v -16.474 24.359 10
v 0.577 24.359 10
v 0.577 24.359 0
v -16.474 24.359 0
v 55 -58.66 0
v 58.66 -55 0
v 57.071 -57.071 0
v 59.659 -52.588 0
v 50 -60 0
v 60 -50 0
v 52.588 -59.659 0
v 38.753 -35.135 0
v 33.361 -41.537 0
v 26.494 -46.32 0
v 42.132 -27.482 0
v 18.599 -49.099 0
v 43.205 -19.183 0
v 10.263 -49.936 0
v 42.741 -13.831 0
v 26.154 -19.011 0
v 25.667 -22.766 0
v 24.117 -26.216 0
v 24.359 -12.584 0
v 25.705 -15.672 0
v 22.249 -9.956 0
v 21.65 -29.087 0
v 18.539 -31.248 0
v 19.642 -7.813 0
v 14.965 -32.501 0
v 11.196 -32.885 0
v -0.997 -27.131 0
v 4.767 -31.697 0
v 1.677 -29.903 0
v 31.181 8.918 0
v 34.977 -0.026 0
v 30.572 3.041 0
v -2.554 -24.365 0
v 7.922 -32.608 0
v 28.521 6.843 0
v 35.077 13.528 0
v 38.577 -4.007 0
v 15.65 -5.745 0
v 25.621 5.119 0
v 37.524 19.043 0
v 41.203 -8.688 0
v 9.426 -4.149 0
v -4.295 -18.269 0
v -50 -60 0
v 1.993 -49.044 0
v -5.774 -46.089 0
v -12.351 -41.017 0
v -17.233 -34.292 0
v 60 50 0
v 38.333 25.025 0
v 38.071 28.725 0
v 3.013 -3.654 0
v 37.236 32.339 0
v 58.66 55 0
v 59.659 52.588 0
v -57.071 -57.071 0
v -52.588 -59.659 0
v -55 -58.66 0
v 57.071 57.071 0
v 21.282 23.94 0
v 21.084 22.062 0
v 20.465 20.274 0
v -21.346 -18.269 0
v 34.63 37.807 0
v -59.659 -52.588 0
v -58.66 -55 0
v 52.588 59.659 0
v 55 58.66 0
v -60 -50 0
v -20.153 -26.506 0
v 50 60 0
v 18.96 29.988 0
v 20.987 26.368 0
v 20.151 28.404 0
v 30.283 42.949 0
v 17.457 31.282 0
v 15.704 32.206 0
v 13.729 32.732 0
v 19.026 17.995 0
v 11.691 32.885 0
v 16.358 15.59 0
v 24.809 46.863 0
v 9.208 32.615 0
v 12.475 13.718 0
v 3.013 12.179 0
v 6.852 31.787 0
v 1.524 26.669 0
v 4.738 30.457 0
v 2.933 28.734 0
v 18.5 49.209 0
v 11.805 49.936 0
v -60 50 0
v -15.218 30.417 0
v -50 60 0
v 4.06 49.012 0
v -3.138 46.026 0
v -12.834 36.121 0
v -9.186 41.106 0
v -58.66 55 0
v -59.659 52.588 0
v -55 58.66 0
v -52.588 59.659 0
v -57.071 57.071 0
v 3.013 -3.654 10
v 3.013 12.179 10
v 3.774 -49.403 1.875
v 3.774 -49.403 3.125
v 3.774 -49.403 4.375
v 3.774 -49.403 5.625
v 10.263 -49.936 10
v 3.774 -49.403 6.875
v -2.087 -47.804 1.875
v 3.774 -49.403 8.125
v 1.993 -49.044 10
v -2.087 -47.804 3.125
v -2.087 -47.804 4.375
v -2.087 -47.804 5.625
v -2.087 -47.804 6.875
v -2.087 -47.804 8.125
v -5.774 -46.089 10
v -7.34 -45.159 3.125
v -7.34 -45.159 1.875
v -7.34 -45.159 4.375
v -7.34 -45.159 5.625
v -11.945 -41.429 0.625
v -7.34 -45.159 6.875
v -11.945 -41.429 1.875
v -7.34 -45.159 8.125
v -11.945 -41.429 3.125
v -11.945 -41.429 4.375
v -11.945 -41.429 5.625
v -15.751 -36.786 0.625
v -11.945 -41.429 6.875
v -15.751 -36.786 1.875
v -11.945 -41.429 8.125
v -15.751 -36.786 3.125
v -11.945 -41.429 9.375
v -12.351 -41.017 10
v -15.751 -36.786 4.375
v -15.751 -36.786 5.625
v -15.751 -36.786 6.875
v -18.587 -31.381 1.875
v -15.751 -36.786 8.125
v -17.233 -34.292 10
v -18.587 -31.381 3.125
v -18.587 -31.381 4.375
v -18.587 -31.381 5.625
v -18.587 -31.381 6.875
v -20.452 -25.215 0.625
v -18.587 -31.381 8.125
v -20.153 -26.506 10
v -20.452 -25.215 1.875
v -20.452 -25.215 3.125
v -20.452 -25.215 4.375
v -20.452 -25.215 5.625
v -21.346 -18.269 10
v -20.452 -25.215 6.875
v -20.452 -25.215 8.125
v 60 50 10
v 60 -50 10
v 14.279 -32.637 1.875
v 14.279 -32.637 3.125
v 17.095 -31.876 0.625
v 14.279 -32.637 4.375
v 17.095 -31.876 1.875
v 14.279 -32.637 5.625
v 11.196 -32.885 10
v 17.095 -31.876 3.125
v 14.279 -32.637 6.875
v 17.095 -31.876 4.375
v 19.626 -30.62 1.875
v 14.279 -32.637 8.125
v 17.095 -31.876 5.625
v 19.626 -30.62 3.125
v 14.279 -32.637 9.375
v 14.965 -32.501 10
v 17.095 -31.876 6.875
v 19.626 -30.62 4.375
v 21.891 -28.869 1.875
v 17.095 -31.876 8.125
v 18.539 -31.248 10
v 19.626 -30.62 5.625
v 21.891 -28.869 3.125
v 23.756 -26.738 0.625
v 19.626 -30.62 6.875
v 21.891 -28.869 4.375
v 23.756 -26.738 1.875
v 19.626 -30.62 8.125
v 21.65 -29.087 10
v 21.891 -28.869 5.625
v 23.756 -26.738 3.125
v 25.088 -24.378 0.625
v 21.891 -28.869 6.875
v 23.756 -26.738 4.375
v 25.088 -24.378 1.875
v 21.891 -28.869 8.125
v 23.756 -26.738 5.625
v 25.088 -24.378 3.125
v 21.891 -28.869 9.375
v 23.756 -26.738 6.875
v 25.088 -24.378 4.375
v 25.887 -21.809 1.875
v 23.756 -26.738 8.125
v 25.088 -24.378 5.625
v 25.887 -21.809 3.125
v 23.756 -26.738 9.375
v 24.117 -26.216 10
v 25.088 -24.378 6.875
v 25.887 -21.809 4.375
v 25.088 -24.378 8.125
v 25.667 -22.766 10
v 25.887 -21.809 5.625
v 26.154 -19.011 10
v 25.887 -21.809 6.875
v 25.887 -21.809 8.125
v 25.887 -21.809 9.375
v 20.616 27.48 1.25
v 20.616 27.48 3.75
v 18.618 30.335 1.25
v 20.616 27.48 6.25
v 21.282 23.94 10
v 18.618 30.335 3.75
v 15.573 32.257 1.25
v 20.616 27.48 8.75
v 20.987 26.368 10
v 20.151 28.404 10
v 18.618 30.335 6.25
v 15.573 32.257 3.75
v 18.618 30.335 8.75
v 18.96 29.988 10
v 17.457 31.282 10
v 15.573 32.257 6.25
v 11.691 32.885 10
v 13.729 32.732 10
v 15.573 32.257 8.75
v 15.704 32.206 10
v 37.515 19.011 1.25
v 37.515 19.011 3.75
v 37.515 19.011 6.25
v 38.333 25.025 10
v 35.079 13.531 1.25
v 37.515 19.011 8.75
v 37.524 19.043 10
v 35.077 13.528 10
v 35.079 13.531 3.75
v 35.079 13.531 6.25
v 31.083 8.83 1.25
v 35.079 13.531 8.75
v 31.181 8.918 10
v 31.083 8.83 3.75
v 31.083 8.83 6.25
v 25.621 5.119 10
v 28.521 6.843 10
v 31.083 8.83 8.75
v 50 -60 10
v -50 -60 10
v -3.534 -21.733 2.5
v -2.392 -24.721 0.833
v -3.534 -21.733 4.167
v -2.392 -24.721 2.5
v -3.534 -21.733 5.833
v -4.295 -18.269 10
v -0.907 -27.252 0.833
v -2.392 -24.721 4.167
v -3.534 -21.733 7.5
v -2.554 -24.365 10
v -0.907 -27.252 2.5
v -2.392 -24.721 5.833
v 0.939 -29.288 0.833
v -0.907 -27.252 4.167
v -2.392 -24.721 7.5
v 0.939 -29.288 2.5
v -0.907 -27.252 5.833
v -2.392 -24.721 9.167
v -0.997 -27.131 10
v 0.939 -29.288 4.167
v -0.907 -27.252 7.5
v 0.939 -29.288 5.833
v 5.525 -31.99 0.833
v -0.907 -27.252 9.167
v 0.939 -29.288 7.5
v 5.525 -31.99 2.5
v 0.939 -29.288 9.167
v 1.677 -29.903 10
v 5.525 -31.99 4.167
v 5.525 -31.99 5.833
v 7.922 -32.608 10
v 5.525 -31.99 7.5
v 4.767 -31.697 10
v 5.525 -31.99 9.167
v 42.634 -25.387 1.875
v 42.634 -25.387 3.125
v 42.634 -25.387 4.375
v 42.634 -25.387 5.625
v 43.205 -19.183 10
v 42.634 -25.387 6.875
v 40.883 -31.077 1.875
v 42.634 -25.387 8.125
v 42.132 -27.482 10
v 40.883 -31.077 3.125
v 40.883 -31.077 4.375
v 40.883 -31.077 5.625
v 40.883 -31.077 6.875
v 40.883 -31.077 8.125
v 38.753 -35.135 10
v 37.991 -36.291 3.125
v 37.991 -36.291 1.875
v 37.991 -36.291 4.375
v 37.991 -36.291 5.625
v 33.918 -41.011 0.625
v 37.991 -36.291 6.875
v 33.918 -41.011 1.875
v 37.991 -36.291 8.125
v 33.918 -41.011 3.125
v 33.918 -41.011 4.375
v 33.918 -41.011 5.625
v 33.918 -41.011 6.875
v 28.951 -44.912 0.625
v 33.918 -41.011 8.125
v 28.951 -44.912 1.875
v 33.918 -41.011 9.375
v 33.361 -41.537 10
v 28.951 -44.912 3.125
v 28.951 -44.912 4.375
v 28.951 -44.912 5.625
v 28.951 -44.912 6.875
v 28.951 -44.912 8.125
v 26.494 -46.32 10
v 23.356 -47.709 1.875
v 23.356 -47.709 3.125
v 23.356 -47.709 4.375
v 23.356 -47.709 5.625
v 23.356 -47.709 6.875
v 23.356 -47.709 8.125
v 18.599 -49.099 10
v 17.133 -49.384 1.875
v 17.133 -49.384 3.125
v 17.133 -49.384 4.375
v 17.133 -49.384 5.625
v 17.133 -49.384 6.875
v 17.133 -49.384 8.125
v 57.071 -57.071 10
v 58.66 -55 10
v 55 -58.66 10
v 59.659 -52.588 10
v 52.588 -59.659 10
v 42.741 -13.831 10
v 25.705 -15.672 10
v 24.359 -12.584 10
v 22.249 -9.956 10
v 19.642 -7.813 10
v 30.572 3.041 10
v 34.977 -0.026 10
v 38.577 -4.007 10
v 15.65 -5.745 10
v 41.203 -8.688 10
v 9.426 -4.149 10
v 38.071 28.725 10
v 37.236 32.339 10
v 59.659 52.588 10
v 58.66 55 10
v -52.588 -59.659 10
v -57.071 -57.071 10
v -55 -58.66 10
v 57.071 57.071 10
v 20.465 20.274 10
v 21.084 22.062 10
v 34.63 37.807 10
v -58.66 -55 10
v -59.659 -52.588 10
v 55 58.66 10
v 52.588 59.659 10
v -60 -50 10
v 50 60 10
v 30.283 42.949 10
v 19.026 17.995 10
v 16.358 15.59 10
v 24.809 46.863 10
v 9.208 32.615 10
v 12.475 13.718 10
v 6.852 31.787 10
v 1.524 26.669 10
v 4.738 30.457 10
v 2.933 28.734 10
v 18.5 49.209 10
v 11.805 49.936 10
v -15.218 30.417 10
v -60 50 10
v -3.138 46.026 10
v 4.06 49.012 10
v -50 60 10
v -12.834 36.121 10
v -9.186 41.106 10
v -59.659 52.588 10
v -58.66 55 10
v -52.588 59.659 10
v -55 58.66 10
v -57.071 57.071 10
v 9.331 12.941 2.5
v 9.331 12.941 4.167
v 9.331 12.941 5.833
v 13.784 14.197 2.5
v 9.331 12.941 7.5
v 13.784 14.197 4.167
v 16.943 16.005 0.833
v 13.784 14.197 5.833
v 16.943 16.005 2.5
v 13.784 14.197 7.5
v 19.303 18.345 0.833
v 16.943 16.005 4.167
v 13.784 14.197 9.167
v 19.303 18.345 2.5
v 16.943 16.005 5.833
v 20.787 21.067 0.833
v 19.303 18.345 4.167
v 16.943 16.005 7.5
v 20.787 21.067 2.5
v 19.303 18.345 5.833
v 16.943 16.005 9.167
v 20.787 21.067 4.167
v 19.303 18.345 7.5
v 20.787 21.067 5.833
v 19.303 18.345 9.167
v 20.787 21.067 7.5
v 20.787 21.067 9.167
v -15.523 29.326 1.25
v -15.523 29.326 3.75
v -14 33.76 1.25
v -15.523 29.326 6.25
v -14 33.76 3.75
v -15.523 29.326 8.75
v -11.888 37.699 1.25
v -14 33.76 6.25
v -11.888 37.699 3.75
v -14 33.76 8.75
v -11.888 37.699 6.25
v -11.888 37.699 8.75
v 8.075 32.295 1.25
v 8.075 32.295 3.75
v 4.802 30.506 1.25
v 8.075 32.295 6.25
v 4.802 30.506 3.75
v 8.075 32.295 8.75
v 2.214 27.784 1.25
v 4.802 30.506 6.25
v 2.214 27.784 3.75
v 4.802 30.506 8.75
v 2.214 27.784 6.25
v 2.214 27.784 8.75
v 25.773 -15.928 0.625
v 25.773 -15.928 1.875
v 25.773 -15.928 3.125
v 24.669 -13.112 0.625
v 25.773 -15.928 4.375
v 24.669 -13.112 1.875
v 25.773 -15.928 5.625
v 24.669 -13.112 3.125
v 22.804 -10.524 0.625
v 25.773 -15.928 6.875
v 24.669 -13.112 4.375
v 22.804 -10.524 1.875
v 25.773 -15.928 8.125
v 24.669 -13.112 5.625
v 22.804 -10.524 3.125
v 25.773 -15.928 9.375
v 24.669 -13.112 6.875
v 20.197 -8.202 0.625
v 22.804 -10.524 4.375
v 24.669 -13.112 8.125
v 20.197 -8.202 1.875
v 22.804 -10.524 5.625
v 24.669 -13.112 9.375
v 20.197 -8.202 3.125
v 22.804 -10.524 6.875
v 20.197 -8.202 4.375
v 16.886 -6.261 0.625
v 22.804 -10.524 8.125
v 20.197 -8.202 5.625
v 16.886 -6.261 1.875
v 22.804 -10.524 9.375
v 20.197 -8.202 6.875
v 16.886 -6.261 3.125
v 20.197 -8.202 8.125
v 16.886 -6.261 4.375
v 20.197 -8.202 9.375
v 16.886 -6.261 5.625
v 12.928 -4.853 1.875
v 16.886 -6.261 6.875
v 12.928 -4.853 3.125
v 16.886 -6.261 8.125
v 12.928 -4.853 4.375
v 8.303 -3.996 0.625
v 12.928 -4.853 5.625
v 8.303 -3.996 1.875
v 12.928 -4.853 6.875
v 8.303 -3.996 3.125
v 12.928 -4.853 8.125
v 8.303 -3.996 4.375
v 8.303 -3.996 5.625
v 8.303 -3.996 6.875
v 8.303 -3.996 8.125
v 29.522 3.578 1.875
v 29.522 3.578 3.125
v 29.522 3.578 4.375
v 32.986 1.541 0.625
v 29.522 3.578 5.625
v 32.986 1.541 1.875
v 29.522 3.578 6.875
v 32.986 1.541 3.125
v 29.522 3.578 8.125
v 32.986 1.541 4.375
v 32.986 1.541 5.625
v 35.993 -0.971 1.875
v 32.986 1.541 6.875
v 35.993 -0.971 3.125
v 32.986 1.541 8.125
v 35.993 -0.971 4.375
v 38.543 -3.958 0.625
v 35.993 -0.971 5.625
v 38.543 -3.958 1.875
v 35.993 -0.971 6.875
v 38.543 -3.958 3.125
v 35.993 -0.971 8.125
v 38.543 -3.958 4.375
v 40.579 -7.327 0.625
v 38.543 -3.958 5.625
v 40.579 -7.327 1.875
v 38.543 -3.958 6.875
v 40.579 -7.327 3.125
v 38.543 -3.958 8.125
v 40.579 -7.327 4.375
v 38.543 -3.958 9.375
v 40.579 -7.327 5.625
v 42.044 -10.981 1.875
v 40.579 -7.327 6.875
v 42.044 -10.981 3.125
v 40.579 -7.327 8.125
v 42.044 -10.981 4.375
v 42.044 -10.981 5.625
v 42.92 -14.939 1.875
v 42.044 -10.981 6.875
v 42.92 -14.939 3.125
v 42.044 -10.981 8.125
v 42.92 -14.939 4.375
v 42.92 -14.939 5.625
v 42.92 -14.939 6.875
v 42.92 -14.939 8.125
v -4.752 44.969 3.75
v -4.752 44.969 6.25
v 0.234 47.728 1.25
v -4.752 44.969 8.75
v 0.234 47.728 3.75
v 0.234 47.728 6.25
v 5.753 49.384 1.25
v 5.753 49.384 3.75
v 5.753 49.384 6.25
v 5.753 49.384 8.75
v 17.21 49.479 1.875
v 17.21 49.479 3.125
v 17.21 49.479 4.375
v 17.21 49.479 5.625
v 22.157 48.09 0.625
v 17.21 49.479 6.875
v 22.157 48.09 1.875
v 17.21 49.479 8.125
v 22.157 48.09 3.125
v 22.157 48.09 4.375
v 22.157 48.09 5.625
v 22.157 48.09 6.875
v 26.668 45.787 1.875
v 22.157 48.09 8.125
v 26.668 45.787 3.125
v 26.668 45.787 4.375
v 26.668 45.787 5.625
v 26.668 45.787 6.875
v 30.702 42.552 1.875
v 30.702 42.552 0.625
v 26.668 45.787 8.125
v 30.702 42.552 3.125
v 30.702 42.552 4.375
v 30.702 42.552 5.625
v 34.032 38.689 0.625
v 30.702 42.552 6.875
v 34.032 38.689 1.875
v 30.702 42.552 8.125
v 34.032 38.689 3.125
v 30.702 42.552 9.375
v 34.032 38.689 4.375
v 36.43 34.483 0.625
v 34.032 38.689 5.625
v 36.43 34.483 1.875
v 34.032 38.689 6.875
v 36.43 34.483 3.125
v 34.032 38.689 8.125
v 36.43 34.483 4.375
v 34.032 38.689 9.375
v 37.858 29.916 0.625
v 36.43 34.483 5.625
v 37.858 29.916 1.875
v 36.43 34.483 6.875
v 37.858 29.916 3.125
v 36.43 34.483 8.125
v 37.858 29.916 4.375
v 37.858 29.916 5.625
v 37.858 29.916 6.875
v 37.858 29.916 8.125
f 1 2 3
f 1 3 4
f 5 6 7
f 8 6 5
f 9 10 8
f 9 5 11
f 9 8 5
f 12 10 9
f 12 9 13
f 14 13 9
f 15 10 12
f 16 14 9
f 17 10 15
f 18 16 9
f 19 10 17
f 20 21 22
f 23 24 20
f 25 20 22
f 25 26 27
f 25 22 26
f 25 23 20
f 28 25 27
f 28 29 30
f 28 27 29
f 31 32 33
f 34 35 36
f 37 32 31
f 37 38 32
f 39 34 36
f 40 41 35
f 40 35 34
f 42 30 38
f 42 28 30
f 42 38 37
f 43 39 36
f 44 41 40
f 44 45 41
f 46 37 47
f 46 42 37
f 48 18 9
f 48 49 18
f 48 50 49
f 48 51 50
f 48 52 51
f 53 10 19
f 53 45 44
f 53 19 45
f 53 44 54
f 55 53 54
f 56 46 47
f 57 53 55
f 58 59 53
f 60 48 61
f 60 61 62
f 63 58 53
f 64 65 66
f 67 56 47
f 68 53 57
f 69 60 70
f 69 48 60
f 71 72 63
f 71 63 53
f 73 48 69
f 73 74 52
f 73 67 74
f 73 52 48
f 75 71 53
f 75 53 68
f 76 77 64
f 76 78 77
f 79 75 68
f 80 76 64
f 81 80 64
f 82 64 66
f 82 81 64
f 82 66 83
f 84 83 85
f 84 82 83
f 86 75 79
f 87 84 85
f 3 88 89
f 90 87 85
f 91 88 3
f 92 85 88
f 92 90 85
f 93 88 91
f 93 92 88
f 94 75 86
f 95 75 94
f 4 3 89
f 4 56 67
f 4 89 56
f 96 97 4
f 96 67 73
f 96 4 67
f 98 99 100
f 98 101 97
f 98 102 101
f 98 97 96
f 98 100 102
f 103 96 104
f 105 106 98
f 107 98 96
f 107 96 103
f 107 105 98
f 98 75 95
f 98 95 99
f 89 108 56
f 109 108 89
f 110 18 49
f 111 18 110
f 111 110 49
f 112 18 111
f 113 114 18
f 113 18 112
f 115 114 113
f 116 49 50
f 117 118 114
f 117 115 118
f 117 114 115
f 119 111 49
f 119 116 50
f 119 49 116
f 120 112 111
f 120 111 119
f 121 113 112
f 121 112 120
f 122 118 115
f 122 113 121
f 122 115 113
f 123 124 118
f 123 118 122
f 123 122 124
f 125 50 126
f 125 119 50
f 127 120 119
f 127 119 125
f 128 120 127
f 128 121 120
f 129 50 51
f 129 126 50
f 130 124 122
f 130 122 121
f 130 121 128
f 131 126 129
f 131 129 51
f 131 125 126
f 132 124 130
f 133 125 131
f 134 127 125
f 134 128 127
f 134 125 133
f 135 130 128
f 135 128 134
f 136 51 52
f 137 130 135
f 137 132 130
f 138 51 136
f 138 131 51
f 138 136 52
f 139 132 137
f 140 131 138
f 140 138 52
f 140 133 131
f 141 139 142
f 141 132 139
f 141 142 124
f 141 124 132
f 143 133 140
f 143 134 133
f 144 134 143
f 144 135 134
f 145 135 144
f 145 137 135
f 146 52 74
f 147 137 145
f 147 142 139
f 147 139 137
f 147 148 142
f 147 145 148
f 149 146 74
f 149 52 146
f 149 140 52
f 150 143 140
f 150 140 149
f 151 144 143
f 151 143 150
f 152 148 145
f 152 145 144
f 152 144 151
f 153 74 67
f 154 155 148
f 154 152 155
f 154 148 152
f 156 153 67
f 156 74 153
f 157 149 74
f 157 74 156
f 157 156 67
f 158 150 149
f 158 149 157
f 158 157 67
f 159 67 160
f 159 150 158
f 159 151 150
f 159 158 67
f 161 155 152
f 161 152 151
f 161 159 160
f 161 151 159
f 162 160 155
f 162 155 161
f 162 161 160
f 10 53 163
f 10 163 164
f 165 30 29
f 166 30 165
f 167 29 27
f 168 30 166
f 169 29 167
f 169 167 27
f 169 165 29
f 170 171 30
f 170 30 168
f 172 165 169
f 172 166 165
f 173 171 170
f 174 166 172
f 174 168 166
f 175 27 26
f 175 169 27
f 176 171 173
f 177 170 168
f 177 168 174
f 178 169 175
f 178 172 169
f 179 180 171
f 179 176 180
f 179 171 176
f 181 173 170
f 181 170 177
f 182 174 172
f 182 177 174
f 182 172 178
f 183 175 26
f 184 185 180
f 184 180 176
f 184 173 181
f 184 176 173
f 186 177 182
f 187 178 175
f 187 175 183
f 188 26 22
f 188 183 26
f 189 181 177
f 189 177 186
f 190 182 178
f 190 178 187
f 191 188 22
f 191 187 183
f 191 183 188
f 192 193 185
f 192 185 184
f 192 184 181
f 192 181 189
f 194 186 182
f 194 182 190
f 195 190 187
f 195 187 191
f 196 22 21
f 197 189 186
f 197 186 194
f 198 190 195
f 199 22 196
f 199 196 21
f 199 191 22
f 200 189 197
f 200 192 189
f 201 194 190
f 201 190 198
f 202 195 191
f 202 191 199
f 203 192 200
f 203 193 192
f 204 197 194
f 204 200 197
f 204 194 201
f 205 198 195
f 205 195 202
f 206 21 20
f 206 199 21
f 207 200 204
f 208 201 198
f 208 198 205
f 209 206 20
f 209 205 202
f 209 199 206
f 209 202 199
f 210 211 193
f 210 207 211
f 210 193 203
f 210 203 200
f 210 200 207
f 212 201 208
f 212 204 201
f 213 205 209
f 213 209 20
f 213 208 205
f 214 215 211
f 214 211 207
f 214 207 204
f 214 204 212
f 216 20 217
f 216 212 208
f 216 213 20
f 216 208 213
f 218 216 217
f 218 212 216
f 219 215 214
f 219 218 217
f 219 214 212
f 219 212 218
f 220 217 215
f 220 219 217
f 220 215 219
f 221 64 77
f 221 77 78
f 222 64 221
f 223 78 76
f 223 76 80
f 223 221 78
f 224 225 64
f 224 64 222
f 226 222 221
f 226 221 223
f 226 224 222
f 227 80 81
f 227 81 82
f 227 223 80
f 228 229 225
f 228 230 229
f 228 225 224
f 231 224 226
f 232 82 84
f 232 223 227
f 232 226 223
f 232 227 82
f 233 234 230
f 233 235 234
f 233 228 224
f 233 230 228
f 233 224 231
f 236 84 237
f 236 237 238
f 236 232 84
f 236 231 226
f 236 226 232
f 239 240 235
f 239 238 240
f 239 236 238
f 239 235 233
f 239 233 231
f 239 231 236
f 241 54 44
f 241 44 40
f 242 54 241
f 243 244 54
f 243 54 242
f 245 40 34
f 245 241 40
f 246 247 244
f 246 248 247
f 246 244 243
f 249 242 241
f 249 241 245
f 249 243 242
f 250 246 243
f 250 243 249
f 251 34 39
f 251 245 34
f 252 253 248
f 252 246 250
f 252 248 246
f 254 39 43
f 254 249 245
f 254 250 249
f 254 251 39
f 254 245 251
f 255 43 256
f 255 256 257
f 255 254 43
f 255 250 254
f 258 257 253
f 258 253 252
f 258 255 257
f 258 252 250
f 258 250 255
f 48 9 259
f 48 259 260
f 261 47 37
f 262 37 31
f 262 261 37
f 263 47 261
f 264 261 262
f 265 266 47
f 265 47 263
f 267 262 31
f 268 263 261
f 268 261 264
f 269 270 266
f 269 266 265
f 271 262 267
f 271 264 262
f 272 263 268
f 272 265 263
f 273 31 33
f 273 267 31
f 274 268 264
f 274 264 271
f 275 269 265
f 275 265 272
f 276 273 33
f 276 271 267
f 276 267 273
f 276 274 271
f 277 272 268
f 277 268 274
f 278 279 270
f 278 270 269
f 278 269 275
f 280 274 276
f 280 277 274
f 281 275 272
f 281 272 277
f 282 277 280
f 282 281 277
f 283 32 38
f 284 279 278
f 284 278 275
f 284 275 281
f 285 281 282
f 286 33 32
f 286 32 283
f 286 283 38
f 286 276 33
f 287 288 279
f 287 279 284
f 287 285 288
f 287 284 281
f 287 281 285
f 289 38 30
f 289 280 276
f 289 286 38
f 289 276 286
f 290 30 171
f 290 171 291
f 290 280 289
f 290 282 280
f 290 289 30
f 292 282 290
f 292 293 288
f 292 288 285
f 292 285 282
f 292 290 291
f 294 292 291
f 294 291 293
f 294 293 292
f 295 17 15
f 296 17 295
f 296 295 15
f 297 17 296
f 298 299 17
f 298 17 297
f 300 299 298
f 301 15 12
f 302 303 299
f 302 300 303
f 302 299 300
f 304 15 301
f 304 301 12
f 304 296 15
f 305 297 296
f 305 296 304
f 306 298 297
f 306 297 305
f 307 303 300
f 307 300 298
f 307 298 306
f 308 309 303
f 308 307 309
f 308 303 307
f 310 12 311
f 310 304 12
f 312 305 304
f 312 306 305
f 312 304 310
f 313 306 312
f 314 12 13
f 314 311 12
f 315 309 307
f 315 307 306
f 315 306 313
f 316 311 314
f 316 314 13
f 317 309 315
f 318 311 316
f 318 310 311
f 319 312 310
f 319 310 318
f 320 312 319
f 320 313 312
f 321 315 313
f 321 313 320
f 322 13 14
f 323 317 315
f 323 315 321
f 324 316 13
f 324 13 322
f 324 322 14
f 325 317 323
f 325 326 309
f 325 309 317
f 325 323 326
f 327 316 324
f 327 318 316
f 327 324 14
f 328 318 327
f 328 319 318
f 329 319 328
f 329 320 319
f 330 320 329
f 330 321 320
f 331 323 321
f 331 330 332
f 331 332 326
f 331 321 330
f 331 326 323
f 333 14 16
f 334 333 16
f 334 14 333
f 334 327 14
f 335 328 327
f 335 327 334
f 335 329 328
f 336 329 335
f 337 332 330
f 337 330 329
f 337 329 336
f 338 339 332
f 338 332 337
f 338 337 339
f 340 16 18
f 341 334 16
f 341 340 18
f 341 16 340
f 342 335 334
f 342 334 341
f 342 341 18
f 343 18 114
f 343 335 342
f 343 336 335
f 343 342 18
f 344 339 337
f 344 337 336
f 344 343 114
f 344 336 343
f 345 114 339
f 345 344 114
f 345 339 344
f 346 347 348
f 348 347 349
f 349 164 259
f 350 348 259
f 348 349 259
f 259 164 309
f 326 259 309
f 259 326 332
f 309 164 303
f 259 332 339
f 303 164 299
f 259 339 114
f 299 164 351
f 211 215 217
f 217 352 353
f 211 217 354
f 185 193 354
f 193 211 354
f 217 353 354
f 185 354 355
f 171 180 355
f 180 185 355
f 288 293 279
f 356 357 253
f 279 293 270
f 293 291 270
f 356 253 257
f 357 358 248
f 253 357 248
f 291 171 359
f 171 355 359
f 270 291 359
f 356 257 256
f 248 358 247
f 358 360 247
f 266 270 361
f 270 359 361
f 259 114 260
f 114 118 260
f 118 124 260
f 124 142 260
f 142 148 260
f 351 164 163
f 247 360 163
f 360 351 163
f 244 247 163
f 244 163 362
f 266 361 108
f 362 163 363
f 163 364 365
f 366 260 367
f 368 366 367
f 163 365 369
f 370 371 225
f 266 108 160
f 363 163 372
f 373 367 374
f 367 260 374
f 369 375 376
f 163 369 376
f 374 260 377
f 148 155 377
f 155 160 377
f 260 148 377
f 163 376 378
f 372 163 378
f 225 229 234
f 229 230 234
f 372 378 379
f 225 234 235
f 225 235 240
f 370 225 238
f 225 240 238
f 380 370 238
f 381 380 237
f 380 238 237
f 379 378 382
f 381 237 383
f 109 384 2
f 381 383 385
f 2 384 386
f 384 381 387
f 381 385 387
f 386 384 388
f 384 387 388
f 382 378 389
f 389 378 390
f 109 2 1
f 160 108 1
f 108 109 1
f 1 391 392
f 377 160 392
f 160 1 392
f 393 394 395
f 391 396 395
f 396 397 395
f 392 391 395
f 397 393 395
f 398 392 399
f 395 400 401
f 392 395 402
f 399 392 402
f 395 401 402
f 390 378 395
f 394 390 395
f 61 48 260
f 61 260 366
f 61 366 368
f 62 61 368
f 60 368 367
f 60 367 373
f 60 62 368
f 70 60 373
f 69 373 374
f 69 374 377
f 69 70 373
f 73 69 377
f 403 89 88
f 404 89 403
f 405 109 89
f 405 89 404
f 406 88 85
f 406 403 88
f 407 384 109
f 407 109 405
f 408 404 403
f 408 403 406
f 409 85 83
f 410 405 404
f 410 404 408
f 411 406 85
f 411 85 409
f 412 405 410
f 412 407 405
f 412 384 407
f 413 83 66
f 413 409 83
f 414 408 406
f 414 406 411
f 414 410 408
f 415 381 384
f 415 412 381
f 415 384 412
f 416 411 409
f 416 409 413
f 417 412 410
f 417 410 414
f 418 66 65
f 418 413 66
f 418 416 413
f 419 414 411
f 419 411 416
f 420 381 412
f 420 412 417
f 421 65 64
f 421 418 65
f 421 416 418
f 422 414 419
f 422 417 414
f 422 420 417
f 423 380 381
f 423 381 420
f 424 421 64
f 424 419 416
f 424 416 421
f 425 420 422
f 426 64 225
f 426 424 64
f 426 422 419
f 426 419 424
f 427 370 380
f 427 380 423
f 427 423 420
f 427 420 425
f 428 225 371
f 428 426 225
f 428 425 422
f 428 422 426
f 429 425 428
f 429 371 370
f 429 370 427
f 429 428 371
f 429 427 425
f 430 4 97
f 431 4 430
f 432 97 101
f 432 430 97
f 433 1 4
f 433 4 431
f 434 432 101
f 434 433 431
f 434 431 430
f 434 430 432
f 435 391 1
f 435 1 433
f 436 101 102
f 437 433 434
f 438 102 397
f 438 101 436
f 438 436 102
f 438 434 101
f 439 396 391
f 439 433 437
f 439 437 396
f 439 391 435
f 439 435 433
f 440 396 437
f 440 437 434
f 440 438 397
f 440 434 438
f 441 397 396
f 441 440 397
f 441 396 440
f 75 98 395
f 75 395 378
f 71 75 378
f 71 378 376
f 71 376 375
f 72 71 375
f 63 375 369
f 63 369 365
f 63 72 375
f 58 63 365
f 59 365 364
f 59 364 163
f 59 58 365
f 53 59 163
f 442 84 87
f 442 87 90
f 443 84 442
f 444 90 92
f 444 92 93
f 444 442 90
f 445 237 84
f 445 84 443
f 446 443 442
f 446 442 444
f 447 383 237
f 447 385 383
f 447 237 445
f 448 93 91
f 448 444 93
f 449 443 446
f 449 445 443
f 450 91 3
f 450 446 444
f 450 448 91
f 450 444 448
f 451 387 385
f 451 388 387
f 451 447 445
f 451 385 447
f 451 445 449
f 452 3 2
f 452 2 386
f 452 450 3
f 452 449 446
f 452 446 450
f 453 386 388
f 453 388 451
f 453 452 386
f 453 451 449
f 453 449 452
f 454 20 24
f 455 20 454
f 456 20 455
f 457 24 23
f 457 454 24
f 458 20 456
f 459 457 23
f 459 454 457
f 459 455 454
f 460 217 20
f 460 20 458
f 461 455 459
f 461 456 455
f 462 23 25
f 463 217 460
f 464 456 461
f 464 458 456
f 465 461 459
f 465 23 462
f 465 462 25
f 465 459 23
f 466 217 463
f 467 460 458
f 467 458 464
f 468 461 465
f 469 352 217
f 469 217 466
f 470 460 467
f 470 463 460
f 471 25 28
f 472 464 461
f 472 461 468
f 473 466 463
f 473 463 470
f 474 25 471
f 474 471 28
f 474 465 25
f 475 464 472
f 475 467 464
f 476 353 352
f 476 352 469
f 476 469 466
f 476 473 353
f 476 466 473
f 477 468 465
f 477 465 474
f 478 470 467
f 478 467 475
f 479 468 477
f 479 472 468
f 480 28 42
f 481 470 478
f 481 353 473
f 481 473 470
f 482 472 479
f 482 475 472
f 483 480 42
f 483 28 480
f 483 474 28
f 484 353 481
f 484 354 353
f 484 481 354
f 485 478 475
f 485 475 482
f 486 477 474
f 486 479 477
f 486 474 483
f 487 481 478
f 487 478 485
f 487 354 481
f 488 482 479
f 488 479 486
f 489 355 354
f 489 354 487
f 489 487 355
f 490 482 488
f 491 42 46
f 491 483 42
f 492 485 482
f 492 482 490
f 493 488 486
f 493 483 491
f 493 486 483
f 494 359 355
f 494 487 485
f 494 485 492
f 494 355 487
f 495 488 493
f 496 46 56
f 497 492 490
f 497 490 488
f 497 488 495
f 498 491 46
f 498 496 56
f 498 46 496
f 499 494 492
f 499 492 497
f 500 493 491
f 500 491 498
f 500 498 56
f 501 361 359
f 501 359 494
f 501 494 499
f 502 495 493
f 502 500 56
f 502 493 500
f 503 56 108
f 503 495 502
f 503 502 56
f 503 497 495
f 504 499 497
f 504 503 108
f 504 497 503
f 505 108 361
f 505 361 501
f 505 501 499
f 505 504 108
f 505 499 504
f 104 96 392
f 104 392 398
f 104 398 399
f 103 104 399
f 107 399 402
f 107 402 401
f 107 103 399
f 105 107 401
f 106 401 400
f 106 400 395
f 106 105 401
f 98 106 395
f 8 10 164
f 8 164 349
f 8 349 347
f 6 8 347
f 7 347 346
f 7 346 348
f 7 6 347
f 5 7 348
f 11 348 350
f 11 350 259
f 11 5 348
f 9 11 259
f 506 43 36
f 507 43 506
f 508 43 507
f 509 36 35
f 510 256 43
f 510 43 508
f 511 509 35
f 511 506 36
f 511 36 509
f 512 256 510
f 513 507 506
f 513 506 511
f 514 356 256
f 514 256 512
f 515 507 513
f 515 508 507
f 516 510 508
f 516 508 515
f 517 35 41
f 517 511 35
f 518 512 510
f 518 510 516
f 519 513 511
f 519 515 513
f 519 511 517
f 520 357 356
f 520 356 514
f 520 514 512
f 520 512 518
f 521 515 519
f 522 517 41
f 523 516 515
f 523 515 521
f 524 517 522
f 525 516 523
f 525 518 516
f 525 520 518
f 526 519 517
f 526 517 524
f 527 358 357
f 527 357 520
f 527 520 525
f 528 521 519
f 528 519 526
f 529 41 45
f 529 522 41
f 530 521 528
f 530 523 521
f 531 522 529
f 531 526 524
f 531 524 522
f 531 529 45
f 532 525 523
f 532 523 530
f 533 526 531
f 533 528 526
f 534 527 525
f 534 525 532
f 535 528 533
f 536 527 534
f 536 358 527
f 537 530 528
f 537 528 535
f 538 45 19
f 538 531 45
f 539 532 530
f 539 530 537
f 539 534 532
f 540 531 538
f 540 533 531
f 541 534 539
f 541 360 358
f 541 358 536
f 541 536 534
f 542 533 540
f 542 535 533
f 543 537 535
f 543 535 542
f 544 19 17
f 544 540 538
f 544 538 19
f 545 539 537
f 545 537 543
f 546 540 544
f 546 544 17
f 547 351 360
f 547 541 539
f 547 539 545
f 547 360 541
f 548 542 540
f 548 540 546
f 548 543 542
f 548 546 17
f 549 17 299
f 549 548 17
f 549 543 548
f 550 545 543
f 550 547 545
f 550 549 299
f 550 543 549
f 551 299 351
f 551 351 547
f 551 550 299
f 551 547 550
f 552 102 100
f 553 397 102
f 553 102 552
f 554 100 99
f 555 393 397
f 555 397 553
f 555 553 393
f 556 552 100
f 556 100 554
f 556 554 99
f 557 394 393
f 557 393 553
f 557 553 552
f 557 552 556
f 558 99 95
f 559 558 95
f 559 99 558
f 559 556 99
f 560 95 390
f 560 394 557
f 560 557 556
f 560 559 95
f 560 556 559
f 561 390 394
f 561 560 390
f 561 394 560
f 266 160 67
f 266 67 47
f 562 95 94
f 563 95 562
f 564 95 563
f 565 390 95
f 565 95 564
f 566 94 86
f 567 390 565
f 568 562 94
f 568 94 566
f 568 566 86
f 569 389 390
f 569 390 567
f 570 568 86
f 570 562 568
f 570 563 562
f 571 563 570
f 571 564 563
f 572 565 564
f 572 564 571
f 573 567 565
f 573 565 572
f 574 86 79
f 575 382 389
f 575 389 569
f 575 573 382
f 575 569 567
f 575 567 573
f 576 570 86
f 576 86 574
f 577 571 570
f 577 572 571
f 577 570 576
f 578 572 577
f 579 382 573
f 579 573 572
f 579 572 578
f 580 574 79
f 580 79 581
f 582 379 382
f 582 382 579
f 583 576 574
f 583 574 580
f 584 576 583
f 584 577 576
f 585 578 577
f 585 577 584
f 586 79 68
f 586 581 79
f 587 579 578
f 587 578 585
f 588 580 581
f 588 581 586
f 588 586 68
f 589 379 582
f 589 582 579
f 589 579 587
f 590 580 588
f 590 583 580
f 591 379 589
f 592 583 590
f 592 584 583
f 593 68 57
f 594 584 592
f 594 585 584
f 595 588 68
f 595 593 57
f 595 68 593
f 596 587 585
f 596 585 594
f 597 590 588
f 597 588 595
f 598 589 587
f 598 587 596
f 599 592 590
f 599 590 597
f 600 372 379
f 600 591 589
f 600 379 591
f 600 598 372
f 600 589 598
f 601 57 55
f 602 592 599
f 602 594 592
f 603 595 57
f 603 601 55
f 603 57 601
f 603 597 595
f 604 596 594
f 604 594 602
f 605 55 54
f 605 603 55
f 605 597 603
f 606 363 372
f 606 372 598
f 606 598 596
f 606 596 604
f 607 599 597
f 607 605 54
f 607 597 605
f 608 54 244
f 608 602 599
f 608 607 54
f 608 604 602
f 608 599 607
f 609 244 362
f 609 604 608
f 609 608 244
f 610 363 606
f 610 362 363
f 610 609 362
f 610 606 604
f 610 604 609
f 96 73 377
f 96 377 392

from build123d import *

# Parameters (mm, degrees)
BOSS_EXTRUDE1_DEPTH = 10
CUT_EXTRUDE1_DEPTH  = 10


with BuildPart() as part:
    # Sketch1 → Boss-Extrude1 (new body)
    with BuildSketch(Plane.XY):
        with BuildLine():
            Line((-50, 60), (50, 60))
            ThreePointArc((50, 60), (57.071067812, 57.071067812), (60, 50))
            Line((60, 50), (60, -50))
            ThreePointArc((60, -50), (57.071067812, -57.071067812), (50, -60))
            Line((50, -60), (-50, -60))
            ThreePointArc((-50, -60), (-57.071067812, -57.071067812), (-60, -50))
            Line((-60, -50), (-60, 50))
            ThreePointArc((-60, 50), (-57.071067812, 57.071067812), (-50, 60))
        make_face()
    extrude(amount=BOSS_EXTRUDE1_DEPTH)

    # Sketch2 → Cut-Extrude1 (cut)
    with BuildSketch(Plane.XY.offset(10)):
        with BuildLine():
            Line((0.576923077, 24.358974359), (-16.474358974, 24.358974359))
            add(Edge.make_bspline(
                [(-16.474358974, 24.358974359), (-16.353970438, 25.211307119), (-16.117956688, 26.882249036), (-15.553207348, 29.301356677), (-14.877706194, 31.596045832), (-14.034377515, 33.75904969), (-13.045290174, 35.794221276), (-11.920502083, 37.708544306), (-10.647853859, 39.493802146), (-9.672355516, 40.569248555), (-9.185697115, 41.105769231)],
                knots=[0, 0, 0, 0, 1.111473889, 2.178970933, 3.205615836, 4.199322666, 5.174200091, 6.12565194, 7.064921805, 8, 8, 8, 8], degree=3))
            add(Edge.make_bspline(
                [(-9.185697115, 41.105769231), (-8.483756858, 41.813669386), (-7.10030638, 43.208866194), (-4.788398372, 44.995959193), (-2.365091827, 46.542566651), (0.218213736, 47.768728226), (2.92132013, 48.761163974), (5.765723399, 49.427785309), (8.739800279, 49.87009445), (10.769233604, 49.913663441), (11.804887821, 49.935897436)],
                knots=[0, 0, 0, 0, 1.01925491, 2.00884431, 2.983262333, 3.955970413, 4.92937149, 5.924503185, 6.940838805, 8, 8, 8, 8], degree=3))
            add(Edge.make_bspline(
                [(11.804887821, 49.935897436), (12.725637707, 49.914160335), (14.535646445, 49.871429576), (17.19590386, 49.528410226), (19.732236676, 48.926792485), (22.171454673, 48.140190789), (24.477684901, 47.069887718), (26.701828098, 45.82749366), (28.781741625, 44.303645718), (30.722292085, 42.581850898), (32.505057791, 40.719561249), (34.048940704, 38.728926766), (35.376244548, 36.663121884), (36.469767354, 34.504983674), (37.31053779, 32.250860305), (37.894057408, 29.913773543), (38.275985165, 27.498880346), (38.31403515, 25.857509967), (38.333333333, 25.025040064)],
                knots=[0, 0, 0, 0, 1.091422571, 2.145516843, 3.172569842, 4.178562979, 5.178154469, 6.181868002, 7.194278174, 8.227918432, 9.254613415, 10.245994977, 11.209837596, 12.161663635, 13.10878368, 14.055455738, 15.013766427, 16, 16, 16, 16], degree=3))
            add(Edge.make_bspline(
                [(38.333333333, 25.025040064), (38.293732308, 23.994095409), (38.215770063, 21.964482346), (37.576033403, 18.993992832), (36.574671568, 16.153674752), (35.128107, 13.483268429), (33.319532856, 10.990041205), (31.100472953, 8.757349154), (28.534131878, 6.750186691), (26.607545449, 5.671537337), (25.62099359, 5.119190705)],
                knots=[0, 0, 0, 0, 0.992805628, 1.954529043, 2.915727527, 3.886831945, 4.871318353, 5.87440735, 6.911542536, 8, 8, 8, 8], degree=3))
            add(Edge.make_bspline(
                [(25.62099359, 5.119190705), (26.298147652, 4.896866769), (27.628725011, 4.460010206), (29.51998074, 3.599626149), (31.31834883, 2.659368988), (32.99286203, 1.567038026), (34.560175394, 0.366802286), (36.010734394, -0.951598279), (37.353205786, -2.385288944), (38.565674269, -3.942154462), (39.641787421, -5.5972958), (40.607326451, -7.312480175), (41.402018895, -9.113718663), (42.07522233, -10.980439908), (42.587761098, -12.929421022), (42.94863419, -14.953109858), (43.157227694, -17.046890251), (43.189041761, -18.465425199), (43.205128205, -19.182692308)],
                knots=[0, 0, 0, 0, 1.059543567, 2.081955587, 3.086750234, 4.076226789, 5.052108497, 6.020845489, 6.989030705, 7.970690546, 8.952259656, 9.923888338, 10.895517021, 11.877585046, 12.873342345, 13.889638361, 14.932918083, 16, 16, 16, 16], degree=3))
            add(Edge.make_bspline(
                [(43.205128205, -19.182692308), (43.17251882, -20.236783738), (43.108219755, -22.315237362), (42.699436391, -25.376586846), (41.938355422, -28.295311592), (40.937111249, -31.104995931), (39.601560188, -33.769367864), (38.029841121, -36.34957109), (36.097882591, -38.756124872), (33.950842418, -41.052652256), (31.566429135, -43.140552122), (28.981337229, -44.950667352), (26.252410658, -46.504068279), (23.362384275, -47.765163409), (20.312262141, -48.736350893), (17.108842711, -49.438369972), (13.738666093, -49.86787686), (11.438256871, -49.912902514), (10.263421474, -49.935897436)],
                knots=[0, 0, 0, 0, 1.005138573, 1.981928558, 2.936866704, 3.876260664, 4.820238198, 5.773547, 6.751179199, 7.756627054, 8.768222608, 9.766606018, 10.760583154, 11.757261445, 12.767156078, 13.807575856, 14.880313354, 16, 16, 16, 16], degree=3))
            add(Edge.make_bspline(
                [(10.263421474, -49.935897436), (9.152046138, -49.911653178), (6.978898733, -49.86424674), (3.800215835, -49.453919993), (0.779178625, -48.792029652), (-2.09192263, -47.859040331), (-4.801979884, -46.649112625), (-7.375568975, -45.208360206), (-9.761334505, -43.453683826), (-11.985858603, -41.464292892), (-13.999794607, -39.232309222), (-15.799779124, -36.809435607), (-17.34612218, -34.186458852), (-18.645165347, -31.374585409), (-19.686753045, -28.368882405), (-20.508354364, -25.175462089), (-21.082256332, -21.788085508), (-21.25703938, -19.457498358), (-21.346153846, -18.269230769)],
                knots=[0, 0, 0, 0, 1.066544725, 2.085487077, 3.070979577, 4.031932826, 4.977951092, 5.916076795, 6.857635327, 7.814973522, 8.776389752, 9.738577119, 10.707772778, 11.69409279, 12.707140348, 13.757286496, 14.856535458, 16, 16, 16, 16], degree=3))
            Line((-21.346153846, -18.269230769), (-4.294871795, -18.269230769))
            add(Edge.make_bspline(
                [(-4.294871795, -18.269230769), (-4.186819599, -18.866707312), (-3.97635961, -20.030449564), (-3.56587031, -21.715289641), (-3.030945483, -23.270501097), (-2.412439293, -24.709906604), (-1.744359491, -26.052405056), (-0.937159331, -27.248414671), (-0.049986198, -28.330412012), (1.2302111, -29.616702375), (3.060341313, -30.938312023), (5.531623414, -32.086853681), (8.280690724, -32.7600402), (10.202562942, -32.842166887), (11.195913462, -32.884615385)],
                knots=[0, 0, 0, 0, 0.928156231, 1.807827665, 2.648129825, 3.438902246, 4.202261636, 4.936546065, 5.639352463, 6.338805438, 7.70633318, 9.064371875, 10.482673459, 12, 12, 12, 12], degree=3))
            add(Edge.make_bspline(
                [(11.195913462, -32.884615385), (11.723020359, -32.875576377), (12.755504848, -32.857870983), (14.272070822, -32.661630398), (15.716813447, -32.338422007), (17.092423634, -31.899193782), (18.407658596, -31.34859374), (19.637389454, -30.638627935), (20.8066812, -29.813191335), (21.902822566, -28.885181468), (22.915679777, -27.873982913), (23.758436542, -26.754252311), (24.528655243, -25.616405886), (25.098314545, -24.386001717), (25.597458818, -23.129248692), (25.902960612, -21.800530617), (26.133636405, -20.427720421), (26.147042356, -19.488229388), (26.153846154, -19.011418269)],
                knots=[0, 0, 0, 0, 1.110435564, 2.175094844, 3.216326037, 4.226890168, 5.215276772, 6.21526065, 7.213097102, 8.228249917, 9.239874822, 10.221364777, 11.178138315, 12.128914389, 13.072518965, 14.022636769, 14.996447288, 16, 16, 16, 16], degree=3))
            add(Edge.make_bspline(
                [(26.153846154, -19.011418269), (26.135783345, -18.489944075), (26.099824432, -17.451808443), (25.806036347, -15.936867778), (25.342082867, -14.479616956), (24.697594812, -13.086509368), (23.836952841, -11.762679732), (22.821404918, -10.481568019), (21.570942657, -9.309853806), (20.199018093, -8.151649816), (18.608124558, -7.142045251), (16.8757408, -6.210328579), (14.956337088, -5.468969755), (12.896767777, -4.806799007), (10.658074191, -4.323159778), (8.254157787, -3.971990559), (5.688896433, -3.710599501), (3.920628445, -3.673098649), (3.012820513, -3.653846154)],
                knots=[0, 0, 0, 0, 0.809814727, 1.612155564, 2.388397, 3.182215007, 3.988903953, 4.837162975, 5.715530372, 6.646997145, 7.623086902, 8.637258368, 9.698941581, 10.815059213, 11.996518529, 13.252603015, 14.589518788, 16, 16, 16, 16], degree=3))
            Line((3.012820513, -3.653846154), (3.012820513, 12.179487179))
            add(Edge.make_bspline(
                [(3.012820513, 12.179487179), (4.143095378, 12.275745003), (6.257615816, 12.455824329), (9.192683563, 12.876946094), (11.663632261, 13.439844668), (13.729851196, 14.118951328), (15.445507012, 14.991101207), (16.944294459, 15.953916158), (18.235121106, 17.072085016), (19.326042778, 18.312264133), (20.198746175, 19.644100211), (20.816394798, 21.04689257), (21.22425768, 22.477237082), (21.262902657, 23.455549618), (21.282051282, 23.940304487)],
                knots=[0, 0, 0, 0, 1.70044513, 3.18119609, 4.440695891, 5.496282586, 6.431922213, 7.318171381, 8.16090191, 8.983045123, 9.787564368, 10.536848927, 11.275007137, 12, 12, 12, 12], degree=3))
            add(Edge.make_bspline(
                [(21.282051282, 23.940304487), (21.249014421, 24.558799065), (21.184533463, 25.76596954), (20.683739411, 27.493684792), (19.814417678, 29.033799739), (18.648809879, 30.383073548), (17.228476249, 31.510088157), (15.563596248, 32.328281547), (13.690297868, 32.809006698), (12.37233152, 32.858841698), (11.690705128, 32.884615385)],
                knots=[0, 0, 0, 0, 1.009664648, 1.970651636, 2.907870547, 3.878035693, 4.867062054, 5.849714035, 6.887914197, 8, 8, 8, 8], degree=3))
            add(Edge.make_bspline(
                [(11.690705128, 32.884615385), (11.072887442, 32.854205145), (9.846947924, 32.793861915), (8.05425741, 32.343476035), (6.351798685, 31.585307457), (4.774824861, 30.539837669), (3.346099876, 29.284272772), (2.173528872, 27.797316766), (1.198239906, 26.168055763), (0.784840597, 24.964365524), (0.576923077, 24.358974359)],
                knots=[0, 0, 0, 0, 0.98818071, 1.960853194, 2.938124878, 3.957524365, 4.978590984, 5.968022688, 6.978025184, 8, 8, 8, 8], degree=3))
        make_face()
    extrude(amount=-CUT_EXTRUDE1_DEPTH, mode=Mode.SUBTRACT)


solid = part.part
